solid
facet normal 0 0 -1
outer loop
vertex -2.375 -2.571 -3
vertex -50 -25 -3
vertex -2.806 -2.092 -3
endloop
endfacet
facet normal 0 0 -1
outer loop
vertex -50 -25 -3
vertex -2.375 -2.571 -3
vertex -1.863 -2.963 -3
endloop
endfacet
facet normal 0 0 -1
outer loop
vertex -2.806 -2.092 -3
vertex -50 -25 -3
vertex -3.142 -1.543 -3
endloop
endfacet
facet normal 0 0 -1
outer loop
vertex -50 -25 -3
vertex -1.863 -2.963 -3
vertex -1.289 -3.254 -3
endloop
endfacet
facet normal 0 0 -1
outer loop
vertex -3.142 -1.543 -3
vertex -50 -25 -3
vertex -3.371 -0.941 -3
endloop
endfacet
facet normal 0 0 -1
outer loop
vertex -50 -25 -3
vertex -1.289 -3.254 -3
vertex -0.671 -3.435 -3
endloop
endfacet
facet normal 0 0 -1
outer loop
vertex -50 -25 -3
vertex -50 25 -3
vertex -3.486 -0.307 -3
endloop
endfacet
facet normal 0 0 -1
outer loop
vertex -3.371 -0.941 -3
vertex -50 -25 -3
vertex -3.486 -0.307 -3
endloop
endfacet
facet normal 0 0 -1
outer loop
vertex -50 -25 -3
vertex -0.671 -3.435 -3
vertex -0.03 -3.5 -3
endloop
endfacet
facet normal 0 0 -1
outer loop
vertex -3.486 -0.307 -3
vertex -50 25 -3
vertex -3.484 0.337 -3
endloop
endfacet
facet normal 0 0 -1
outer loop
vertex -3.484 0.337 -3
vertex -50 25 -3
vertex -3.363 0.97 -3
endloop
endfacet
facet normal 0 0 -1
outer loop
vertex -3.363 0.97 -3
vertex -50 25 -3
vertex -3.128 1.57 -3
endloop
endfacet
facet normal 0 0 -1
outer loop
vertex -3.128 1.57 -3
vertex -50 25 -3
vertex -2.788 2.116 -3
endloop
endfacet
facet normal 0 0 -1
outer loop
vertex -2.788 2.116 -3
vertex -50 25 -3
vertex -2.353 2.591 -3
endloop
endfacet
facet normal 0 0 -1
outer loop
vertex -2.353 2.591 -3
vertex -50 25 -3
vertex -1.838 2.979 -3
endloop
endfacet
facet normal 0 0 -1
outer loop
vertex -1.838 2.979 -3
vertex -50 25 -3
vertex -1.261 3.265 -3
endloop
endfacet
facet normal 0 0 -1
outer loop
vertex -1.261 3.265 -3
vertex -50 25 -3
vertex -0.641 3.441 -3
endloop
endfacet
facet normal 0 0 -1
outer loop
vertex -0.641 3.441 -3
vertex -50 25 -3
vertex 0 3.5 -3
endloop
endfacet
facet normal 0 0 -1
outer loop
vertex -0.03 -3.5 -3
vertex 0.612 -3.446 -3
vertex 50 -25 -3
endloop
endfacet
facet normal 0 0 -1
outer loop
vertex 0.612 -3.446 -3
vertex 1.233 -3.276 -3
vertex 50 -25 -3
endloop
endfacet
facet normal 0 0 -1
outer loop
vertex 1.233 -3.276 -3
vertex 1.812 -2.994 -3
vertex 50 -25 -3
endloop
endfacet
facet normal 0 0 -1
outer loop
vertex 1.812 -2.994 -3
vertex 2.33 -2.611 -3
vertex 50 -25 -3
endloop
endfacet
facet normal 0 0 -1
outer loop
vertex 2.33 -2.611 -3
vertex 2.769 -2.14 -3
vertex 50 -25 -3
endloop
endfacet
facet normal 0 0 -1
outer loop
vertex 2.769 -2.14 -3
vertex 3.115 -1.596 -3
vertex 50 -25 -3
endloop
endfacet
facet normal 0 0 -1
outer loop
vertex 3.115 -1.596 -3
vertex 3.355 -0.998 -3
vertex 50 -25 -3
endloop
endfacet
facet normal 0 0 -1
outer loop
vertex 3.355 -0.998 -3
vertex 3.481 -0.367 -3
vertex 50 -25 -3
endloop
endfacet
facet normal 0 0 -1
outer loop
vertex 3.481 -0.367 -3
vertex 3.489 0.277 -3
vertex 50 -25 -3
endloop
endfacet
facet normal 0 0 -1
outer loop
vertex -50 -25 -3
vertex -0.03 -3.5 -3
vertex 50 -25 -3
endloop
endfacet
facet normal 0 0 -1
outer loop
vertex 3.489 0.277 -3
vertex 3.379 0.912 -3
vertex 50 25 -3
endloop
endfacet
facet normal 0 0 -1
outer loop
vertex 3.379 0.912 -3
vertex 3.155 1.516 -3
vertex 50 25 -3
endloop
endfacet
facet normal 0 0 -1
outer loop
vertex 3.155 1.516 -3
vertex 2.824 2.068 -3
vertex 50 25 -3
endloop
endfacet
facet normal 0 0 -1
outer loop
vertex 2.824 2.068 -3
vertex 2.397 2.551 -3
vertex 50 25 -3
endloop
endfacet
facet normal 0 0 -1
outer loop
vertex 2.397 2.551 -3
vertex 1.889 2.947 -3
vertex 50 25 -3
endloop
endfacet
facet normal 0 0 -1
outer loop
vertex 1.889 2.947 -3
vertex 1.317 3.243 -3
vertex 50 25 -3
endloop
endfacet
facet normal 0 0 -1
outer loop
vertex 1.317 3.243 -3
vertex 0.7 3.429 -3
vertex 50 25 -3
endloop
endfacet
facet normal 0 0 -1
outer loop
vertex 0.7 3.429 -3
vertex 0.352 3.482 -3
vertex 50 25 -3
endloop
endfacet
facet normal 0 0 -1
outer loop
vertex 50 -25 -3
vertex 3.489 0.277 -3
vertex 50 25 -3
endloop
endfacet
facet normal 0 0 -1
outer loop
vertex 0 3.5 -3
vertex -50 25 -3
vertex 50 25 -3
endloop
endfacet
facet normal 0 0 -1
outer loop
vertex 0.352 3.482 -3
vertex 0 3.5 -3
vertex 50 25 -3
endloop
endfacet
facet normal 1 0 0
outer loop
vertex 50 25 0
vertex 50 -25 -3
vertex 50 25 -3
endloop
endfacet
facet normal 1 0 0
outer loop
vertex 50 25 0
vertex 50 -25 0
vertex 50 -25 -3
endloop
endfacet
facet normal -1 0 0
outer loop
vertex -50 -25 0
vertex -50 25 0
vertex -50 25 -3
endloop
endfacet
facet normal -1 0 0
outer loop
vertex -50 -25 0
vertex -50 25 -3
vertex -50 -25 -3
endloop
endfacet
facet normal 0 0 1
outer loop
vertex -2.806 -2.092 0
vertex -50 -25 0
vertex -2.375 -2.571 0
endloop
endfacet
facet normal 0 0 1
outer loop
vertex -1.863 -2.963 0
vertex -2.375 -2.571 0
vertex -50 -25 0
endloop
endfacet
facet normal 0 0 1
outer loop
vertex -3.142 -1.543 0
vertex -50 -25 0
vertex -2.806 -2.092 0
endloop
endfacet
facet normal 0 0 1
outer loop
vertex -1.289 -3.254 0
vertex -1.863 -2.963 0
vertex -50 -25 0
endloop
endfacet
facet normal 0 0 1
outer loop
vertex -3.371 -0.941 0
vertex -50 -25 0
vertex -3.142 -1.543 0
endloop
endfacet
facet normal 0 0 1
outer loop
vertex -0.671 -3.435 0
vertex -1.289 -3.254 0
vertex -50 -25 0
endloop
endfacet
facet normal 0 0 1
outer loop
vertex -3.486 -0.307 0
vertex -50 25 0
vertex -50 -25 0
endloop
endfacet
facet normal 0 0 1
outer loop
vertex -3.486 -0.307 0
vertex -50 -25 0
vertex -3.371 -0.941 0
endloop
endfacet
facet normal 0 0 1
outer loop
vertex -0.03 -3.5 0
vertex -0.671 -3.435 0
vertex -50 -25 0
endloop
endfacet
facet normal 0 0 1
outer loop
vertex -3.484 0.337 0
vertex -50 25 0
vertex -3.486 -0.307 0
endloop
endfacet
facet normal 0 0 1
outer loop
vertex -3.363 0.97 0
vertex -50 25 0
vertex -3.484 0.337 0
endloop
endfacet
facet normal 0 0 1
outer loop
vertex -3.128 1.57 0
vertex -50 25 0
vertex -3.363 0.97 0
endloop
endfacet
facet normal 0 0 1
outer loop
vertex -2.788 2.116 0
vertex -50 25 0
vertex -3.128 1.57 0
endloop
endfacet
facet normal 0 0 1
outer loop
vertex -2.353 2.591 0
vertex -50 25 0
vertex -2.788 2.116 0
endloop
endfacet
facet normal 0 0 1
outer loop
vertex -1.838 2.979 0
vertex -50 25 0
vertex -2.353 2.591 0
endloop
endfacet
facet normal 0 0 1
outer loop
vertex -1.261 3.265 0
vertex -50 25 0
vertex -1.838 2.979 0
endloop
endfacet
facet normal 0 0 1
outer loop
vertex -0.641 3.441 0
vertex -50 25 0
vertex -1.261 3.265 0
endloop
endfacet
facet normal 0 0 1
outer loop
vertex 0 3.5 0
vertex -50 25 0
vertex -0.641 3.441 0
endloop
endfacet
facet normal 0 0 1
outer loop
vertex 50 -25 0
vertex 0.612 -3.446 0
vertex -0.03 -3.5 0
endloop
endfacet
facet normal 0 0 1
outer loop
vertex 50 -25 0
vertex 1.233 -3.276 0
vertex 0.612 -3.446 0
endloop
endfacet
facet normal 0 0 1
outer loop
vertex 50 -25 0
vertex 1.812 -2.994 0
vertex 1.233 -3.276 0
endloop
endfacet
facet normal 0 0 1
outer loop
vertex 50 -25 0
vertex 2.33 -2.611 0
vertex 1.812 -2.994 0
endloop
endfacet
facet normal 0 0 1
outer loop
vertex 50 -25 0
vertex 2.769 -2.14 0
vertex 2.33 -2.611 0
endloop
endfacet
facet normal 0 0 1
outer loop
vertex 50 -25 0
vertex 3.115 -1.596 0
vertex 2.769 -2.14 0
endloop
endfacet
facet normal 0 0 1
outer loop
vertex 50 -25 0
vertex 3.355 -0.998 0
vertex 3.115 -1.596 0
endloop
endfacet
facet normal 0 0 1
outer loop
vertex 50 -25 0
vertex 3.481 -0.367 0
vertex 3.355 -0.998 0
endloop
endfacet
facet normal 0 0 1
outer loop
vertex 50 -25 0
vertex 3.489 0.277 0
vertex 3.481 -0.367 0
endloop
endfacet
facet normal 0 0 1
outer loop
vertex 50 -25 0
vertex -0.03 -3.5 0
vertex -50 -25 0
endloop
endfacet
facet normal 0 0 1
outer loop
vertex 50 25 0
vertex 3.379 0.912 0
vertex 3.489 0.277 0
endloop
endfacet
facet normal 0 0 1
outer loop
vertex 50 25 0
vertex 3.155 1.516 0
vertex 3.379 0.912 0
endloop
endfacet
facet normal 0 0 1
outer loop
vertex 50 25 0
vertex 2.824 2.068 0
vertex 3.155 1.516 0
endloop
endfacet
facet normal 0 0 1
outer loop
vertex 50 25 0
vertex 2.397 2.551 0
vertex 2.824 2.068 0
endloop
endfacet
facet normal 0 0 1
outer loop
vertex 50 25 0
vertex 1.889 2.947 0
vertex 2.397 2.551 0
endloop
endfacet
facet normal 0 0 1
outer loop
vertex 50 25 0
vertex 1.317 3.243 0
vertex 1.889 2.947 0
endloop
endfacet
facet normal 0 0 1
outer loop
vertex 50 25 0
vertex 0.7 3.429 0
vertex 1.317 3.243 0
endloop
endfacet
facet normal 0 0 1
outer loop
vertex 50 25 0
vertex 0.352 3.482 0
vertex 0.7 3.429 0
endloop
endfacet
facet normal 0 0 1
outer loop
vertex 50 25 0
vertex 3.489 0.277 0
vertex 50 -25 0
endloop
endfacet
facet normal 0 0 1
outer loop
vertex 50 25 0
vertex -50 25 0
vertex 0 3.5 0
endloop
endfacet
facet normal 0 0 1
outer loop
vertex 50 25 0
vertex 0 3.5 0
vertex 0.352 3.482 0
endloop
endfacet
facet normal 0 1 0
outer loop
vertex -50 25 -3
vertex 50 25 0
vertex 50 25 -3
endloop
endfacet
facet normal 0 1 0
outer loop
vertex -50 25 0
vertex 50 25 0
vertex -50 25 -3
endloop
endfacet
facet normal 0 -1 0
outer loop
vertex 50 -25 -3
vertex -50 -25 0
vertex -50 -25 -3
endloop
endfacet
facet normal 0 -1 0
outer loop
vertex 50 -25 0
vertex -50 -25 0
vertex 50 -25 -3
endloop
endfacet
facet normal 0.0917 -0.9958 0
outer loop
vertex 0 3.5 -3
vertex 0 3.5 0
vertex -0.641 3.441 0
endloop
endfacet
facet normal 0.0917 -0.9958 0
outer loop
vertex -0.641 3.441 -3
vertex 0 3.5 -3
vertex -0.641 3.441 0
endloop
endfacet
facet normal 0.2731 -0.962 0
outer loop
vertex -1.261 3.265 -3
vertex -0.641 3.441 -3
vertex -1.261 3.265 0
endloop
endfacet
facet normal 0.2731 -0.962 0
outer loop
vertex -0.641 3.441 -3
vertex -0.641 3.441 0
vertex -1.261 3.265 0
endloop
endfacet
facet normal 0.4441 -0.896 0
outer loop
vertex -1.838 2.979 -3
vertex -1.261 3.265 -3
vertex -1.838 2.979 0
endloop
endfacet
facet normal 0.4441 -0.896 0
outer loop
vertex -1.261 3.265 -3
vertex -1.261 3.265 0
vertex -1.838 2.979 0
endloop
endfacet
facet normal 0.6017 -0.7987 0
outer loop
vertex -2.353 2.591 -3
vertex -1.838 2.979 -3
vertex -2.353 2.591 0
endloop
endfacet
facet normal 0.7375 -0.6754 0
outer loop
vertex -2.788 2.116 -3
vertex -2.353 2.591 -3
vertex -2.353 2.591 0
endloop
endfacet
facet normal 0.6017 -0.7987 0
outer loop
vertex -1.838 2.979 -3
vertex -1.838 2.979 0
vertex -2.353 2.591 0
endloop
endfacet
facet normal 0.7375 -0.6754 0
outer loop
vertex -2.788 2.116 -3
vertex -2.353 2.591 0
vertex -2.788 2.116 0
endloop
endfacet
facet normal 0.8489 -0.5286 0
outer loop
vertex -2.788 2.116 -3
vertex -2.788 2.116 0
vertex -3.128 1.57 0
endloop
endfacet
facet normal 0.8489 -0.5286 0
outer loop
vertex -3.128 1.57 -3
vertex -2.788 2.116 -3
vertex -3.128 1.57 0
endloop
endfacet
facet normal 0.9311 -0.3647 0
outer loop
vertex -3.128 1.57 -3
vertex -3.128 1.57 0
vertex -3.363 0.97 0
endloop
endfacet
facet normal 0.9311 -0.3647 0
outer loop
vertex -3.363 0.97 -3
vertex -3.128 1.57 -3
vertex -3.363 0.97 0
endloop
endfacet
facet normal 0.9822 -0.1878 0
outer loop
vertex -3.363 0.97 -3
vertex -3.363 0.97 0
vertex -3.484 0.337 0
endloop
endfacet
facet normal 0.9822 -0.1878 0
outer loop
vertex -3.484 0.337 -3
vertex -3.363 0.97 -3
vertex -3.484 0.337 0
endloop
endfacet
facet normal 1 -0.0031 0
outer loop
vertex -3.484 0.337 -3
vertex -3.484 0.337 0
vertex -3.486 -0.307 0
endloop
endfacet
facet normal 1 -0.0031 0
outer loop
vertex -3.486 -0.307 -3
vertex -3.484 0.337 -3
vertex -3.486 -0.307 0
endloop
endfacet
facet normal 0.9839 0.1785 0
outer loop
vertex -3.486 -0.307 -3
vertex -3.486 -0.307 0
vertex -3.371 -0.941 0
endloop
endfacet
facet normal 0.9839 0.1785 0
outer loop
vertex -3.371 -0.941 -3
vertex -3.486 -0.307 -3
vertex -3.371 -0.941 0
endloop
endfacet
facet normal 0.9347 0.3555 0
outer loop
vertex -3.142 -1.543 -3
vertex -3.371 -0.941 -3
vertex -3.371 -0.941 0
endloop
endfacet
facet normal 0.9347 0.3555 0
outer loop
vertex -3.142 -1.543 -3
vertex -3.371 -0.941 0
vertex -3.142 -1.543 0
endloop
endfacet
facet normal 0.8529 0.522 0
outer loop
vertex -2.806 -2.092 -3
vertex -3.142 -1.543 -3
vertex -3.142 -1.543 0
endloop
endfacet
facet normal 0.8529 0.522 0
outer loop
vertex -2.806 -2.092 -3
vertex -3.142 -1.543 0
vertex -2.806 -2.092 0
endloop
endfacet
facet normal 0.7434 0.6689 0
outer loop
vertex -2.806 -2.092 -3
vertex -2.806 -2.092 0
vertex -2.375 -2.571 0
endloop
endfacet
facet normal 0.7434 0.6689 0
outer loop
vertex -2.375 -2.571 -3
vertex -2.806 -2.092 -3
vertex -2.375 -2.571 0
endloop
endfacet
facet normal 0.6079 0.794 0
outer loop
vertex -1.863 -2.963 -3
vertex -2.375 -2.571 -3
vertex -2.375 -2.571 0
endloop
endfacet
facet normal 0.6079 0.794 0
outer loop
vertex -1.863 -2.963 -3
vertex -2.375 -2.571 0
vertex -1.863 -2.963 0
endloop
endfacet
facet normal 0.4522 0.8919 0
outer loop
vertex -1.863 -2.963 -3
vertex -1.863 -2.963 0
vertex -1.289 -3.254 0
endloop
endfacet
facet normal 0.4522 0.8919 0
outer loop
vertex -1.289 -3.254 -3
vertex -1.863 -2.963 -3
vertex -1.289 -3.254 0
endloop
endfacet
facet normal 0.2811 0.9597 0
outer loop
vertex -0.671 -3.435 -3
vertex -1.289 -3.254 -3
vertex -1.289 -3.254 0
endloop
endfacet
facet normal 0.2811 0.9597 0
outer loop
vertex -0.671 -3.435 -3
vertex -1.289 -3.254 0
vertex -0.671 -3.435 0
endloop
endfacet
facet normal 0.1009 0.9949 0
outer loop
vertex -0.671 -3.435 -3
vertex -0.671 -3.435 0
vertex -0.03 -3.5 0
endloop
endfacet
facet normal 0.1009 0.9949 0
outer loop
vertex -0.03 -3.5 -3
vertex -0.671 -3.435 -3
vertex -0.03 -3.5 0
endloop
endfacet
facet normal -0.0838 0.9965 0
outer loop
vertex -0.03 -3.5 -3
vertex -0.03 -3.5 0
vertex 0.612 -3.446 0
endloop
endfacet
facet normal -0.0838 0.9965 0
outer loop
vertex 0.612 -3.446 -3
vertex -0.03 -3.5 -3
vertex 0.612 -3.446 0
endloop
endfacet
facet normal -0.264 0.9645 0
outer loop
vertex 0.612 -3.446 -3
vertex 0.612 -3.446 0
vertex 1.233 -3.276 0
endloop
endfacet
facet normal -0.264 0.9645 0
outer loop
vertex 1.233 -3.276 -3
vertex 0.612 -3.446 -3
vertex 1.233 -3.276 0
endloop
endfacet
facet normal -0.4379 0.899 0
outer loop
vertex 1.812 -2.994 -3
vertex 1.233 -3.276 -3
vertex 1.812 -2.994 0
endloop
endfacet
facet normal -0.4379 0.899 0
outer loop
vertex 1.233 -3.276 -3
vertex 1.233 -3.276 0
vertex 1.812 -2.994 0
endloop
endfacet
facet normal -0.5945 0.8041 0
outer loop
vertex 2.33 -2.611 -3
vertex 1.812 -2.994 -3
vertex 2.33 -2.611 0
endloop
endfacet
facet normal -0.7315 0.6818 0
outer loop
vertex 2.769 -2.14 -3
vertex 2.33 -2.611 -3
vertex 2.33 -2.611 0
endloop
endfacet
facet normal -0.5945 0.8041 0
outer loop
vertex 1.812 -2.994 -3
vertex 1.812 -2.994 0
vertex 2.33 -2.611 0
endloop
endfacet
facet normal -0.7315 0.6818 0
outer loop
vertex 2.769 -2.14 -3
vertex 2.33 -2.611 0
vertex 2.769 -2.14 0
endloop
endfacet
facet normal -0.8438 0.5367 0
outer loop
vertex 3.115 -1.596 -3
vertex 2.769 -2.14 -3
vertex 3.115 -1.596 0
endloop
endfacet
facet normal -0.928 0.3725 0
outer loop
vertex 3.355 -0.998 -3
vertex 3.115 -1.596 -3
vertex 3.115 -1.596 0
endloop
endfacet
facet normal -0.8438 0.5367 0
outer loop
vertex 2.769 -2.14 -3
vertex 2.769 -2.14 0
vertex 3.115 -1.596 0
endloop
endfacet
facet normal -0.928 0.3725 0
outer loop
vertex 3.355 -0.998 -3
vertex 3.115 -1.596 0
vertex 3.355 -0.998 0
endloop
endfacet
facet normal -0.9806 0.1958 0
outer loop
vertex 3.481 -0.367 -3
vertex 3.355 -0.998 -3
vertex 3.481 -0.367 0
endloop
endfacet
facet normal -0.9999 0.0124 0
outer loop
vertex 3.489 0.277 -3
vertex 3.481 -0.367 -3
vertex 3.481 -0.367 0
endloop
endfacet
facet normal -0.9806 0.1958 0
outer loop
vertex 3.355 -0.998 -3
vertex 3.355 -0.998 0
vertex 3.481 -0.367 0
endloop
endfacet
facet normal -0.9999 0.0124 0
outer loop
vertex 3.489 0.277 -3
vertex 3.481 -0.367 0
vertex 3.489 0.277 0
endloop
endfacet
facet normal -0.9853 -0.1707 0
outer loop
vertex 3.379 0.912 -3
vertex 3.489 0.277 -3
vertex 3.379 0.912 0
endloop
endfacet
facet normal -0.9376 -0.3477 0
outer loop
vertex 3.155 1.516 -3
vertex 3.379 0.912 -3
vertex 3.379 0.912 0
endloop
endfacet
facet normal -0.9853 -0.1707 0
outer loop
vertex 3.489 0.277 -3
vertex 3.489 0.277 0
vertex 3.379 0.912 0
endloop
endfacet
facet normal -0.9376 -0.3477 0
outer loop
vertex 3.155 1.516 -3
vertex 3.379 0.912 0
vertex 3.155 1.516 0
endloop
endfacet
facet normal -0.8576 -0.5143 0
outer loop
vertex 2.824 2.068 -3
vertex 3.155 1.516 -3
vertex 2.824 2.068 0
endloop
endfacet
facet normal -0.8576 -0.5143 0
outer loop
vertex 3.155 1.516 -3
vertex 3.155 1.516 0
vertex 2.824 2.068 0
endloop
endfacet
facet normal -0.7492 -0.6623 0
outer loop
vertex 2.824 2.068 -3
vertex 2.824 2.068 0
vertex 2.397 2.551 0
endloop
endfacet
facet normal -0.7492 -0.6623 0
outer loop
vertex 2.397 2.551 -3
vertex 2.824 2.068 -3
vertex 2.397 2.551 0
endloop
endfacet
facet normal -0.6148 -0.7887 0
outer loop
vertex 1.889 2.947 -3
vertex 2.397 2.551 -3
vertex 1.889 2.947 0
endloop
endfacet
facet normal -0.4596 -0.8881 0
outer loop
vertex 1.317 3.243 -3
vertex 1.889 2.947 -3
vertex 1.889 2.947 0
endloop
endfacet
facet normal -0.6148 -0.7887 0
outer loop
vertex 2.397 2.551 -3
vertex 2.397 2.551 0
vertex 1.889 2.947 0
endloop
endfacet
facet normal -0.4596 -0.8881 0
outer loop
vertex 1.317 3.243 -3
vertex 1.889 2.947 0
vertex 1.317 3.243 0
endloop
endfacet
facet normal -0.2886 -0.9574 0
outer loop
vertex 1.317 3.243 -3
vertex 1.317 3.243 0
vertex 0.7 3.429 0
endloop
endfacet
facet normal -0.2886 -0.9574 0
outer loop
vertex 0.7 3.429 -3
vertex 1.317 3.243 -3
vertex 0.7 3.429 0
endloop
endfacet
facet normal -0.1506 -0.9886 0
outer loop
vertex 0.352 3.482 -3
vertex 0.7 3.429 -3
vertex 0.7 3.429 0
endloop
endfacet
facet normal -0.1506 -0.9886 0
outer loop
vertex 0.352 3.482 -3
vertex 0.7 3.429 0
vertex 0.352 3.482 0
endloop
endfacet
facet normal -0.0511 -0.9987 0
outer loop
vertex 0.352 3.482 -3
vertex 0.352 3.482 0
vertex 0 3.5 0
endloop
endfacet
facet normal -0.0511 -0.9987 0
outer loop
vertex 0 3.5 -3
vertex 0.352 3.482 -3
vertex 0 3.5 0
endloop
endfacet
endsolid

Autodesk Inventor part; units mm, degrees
ref_plane "YZ Plane" through (0, 0, 0) normal (1, 0, 0) x (0, 1, 0)
ref_plane "XZ Plane" through (0, 0, 0) normal (0, 1, 0) x (-1, 0, 0)
ref_plane "XY Plane" through (0, 0, 0) normal (0, 0, 1) x (1, 0, 0)
sketch "Sketch1" plane through (0, 0, 0) normal (0, 0, 1) x (1, 0, 0)
  ellipse E0 centre (0, 0) end of major axis (0, 3.5) minor radius 3.5 projected
  arc A0 (-2.0076, 1.85) -> (-2.0076, -1.85) centre (0, 0) ccw projected
  line L0 (-2.0076, 1.85) -> (2.0076, 1.85) projected
  arc A1 (2.0076, -1.85) -> (2.0076, 1.85) centre (0, 0) ccw projected
  line L1 (2.0076, -1.85) -> (-2.0076, -1.85) projected
  line L2 (-50, -25) -> (50, -25)
  line L3 (50, -25) -> (50, 25)
  line L4 (50, 25) -> (-50, 25)
  line L5 (-50, 25) -> (-50, -25)
  line L6 (-50, -25) -> (50, 25) construction
  line L7 (50, -25) -> (-50, 25) construction
  point P0 (0, 0)
  dimension "d0" = 100
  dimension "d1" = 50
extrude "Extrusion1" add sketch "Sketch1" against normal blind 3 contours L5 L4 L3 L2
properties part number "arm2"
